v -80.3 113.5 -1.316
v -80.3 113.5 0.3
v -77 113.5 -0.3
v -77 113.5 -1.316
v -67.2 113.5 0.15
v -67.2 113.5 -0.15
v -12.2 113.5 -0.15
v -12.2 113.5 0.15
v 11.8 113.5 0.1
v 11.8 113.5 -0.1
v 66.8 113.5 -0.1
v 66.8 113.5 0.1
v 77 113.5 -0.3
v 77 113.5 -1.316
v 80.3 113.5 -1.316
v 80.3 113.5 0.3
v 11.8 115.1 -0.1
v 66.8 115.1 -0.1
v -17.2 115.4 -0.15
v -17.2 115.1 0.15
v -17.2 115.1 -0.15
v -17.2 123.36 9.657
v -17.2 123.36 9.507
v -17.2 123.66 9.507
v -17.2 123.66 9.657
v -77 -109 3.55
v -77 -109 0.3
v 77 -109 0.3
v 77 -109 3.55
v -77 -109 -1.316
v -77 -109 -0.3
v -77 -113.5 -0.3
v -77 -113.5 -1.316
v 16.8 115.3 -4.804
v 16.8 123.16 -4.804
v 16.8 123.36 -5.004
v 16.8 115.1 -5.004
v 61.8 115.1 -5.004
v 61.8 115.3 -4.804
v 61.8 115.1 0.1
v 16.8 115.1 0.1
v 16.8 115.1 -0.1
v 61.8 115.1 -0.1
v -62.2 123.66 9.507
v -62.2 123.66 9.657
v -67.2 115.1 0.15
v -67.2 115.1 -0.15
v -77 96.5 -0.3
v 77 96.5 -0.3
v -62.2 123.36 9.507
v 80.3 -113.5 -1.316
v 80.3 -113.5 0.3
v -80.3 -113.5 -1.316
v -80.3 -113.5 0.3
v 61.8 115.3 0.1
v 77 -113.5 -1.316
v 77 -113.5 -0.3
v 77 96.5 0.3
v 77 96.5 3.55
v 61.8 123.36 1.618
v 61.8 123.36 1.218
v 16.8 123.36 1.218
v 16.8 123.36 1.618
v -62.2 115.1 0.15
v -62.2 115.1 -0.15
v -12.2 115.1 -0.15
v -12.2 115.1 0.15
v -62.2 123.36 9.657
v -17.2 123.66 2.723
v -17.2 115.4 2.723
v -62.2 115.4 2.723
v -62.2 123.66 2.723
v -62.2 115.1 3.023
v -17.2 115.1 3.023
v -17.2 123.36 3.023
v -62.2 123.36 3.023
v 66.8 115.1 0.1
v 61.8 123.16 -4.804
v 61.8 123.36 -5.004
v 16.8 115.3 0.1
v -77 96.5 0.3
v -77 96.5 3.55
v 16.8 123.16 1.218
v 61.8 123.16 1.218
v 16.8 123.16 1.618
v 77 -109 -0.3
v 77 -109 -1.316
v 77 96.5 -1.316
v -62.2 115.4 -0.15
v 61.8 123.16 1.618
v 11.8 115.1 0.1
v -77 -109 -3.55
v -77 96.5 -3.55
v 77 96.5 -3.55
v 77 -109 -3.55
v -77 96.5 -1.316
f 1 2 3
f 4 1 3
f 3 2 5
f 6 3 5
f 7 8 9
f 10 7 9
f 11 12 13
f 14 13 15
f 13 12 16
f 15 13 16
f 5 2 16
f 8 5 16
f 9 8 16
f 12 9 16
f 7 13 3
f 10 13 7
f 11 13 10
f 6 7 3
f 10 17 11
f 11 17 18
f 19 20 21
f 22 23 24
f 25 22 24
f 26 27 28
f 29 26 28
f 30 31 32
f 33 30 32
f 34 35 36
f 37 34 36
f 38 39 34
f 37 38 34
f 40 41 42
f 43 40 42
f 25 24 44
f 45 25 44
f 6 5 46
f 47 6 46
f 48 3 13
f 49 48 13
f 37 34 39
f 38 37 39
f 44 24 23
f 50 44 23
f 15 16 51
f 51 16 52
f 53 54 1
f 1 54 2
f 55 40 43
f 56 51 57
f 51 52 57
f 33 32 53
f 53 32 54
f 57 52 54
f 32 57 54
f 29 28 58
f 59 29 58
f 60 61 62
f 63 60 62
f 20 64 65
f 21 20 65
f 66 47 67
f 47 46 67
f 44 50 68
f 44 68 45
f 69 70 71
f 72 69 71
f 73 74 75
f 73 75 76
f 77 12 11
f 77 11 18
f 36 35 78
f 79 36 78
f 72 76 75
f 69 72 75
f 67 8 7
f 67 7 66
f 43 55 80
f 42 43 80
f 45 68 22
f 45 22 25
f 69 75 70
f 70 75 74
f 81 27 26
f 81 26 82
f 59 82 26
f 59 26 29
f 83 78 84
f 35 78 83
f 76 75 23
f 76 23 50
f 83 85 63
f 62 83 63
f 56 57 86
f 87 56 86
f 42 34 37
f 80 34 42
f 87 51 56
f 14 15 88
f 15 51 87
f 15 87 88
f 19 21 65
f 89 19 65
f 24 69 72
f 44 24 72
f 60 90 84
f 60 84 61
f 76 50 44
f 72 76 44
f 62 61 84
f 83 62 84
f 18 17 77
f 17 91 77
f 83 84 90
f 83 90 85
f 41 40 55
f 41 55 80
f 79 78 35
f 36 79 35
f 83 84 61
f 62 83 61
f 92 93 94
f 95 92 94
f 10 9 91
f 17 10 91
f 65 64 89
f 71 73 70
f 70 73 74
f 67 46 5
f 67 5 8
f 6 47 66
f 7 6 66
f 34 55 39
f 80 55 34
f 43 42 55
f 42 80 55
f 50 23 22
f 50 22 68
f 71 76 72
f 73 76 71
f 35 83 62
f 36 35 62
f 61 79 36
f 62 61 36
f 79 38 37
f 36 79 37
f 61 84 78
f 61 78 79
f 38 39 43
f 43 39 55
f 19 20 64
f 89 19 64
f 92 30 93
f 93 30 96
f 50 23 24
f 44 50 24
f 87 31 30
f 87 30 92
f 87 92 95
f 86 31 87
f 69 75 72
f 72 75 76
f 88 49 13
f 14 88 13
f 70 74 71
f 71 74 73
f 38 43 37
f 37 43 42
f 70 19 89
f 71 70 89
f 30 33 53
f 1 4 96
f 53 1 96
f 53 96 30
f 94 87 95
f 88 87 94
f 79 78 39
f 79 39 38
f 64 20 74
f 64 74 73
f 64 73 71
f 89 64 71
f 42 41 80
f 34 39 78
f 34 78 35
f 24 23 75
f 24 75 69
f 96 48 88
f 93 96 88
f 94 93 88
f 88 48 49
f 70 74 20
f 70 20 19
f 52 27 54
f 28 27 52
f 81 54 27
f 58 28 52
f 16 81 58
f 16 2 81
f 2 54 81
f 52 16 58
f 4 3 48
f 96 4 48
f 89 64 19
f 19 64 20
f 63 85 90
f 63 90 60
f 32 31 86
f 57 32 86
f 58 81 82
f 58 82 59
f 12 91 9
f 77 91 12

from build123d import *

# Parameters (mm, degrees)
SKETCH1_W                    = 160.6
SKETCH1_H                    = 227
INSULATION_DEPTH             = 0.3
INSULATION_DEPTH_BACK        = 0.3
SKETCH2_W                    = 154
SKETCH2_H                    = 205.5
MAIN_BODY_DEPTH              = 3.55
MAIN_BODY_DEPTH_BACK         = 3.55
SIDE_FOLDS_DEPTH             = 1.016
SKETCH6_W                    = 55
SKETCH6_H                    = 18.6
NEGATIVE_TAB_BASE_DEPTH      = 0.1
NEGATIVE_TAB_BASE_DEPTH_BACK = 0.1
SKETCH7_W                    = 55
SKETCH7_H                    = 18.6
POSITIVE_TAB_BASE_DEPTH      = 0.15
POSITIVE_TAB_BASE_DEPTH_BACK = 0.15
SKETCH110_W                  = 0.3
SKETCH110_H                  = 45
POSITIVE_TAB_DEPTH           = 23.650499994
SKETCH110_ON_SEGMENT_2_W     = 0.3
SKETCH110_ON_SEGMENT_2_H     = 45
POSITIVE_TAB_2_DEPTH         = 49.874449989
SKETCH110_ON_SEGMENT_3_W     = 0.3
SKETCH110_ON_SEGMENT_3_H     = 45
POSITIVE_TAB_3_DEPTH         = 55.260999989
SKETCH110_ON_SEGMENT_4_W     = 0.3
SKETCH110_ON_SEGMENT_4_H     = 45
POSITIVE_TAB_4_DEPTH         = 31.133774994
SKETCH110_ON_SEGMENT_5_W     = 0.3
SKETCH110_ON_SEGMENT_5_H     = 45
POSITIVE_TAB_5_DEPTH         = 1.15
SKETCH113_W                  = 0.2
SKETCH113_H                  = 45
NEGATIVE_TAB_DEPTH           = 23.600222221
SKETCH113_ON_SEGMENT_2_W     = 0.2
SKETCH113_ON_SEGMENT_2_H     = 45
NEGATIVE_TAB_2_DEPTH         = 51.904294442
SKETCH113_ON_SEGMENT_3_W     = 0.2
SKETCH113_ON_SEGMENT_3_H     = 45
NEGATIVE_TAB_3_DEPTH         = 55.060444442
SKETCH113_ON_SEGMENT_4_W     = 0.2
SKETCH113_ON_SEGMENT_4_H     = 45
NEGATIVE_TAB_4_DEPTH         = 30.622297221
SKETCH113_ON_SEGMENT_5_W     = 0.2
SKETCH113_ON_SEGMENT_5_H     = 45
NEGATIVE_TAB_5_DEPTH         = 1.4


with BuildPart() as part:
    # Sketch1 → Insulation (new, two sides)
    with BuildSketch(Plane.XY) as insulation_sk:
        Rectangle(SKETCH1_W, SKETCH1_H)
    extrude(amount=INSULATION_DEPTH)
    extrude(insulation_sk.sketch, amount=-INSULATION_DEPTH_BACK)

    # Sketch2 → Main Body (add, two sides)
    with BuildSketch(Plane.XY) as main_body_sk:
        with Locations((0, -6.25)):
            Rectangle(SKETCH2_W, SKETCH2_H)
    extrude(amount=MAIN_BODY_DEPTH)
    extrude(main_body_sk.sketch, amount=-MAIN_BODY_DEPTH_BACK)

    # Sketch5 → Side Folds (add)
    with BuildSketch(Plane(origin=(0, 0, -0.3), x_dir=(-1, 0, 0), z_dir=(0, 0, -1))):
        Polygon((-77, -109), (-77, 96.5), (-77, 113.5), (-80.3, 113.5), (-80.3, -113.5), (-77, -113.5), align=None)
        Polygon((77, 113.5), (77, 96.5), (77, -109), (77, -113.5), (80.3, -113.5), (80.3, 113.5), align=None)
    extrude(amount=SIDE_FOLDS_DEPTH)

    # Sketch6 → Negative Tab Base (add, two sides)
    with BuildSketch(Plane.XY) as negative_tab_base_sk:
        with Locations((39.3, 105.8)):
            Rectangle(SKETCH6_W, SKETCH6_H)
    extrude(amount=NEGATIVE_TAB_BASE_DEPTH)
    extrude(negative_tab_base_sk.sketch, amount=-NEGATIVE_TAB_BASE_DEPTH_BACK)

    # Sketch7 → Positive Tab Base (add, two sides)
    with BuildSketch(Plane.XY) as positive_tab_base_sk:
        with Locations((-39.7, 105.8)):
            Rectangle(SKETCH7_W, SKETCH7_H)
    extrude(amount=POSITIVE_TAB_BASE_DEPTH)
    extrude(positive_tab_base_sk.sketch, amount=-POSITIVE_TAB_BASE_DEPTH_BACK)


with BuildPart() as body_2:
    # Sketch110 → Positive Tab (new body)
    with BuildSketch(Plane(origin=(-39.7, 115.1, 0), x_dir=(0, 0, -1), z_dir=(0, 1, 0))):
        Rectangle(SKETCH110_W, SKETCH110_H)
    extrude(amount=POSITIVE_TAB_DEPTH)

    # Positive Tab mitre 1
    split(bisect_by=Plane(origin=(-39.7, 115.25, 0), x_dir=(1, 0, 0), z_dir=(0, -0.707106781, -0.707106781)), keep=Keep.TOP)


with BuildPart() as body_3:
    # Sketch110 on segment 2 (carried to segment 2) → Positive Tab 2 (new body)
    with BuildSketch(Plane(origin=(-39.7, 115.25, -23.500499994), x_dir=(0, 1, 0), z_dir=(0, 0, 1))):
        Rectangle(SKETCH110_ON_SEGMENT_2_W, SKETCH110_ON_SEGMENT_2_H)
    extrude(amount=POSITIVE_TAB_2_DEPTH)

    # Positive Tab 2 mitre 1
    split(bisect_by=Plane(origin=(-39.7, 115.25, 0), x_dir=(-1, 0, 0), z_dir=(0, 0.707106781, 0.707106781)), keep=Keep.TOP)

    # Positive Tab 2 mitre 2
    split(bisect_by=Plane(origin=(-39.7, 115.25, 2.87345), x_dir=(1, 0, 0), z_dir=(0, -0.707106781, -0.707106781)), keep=Keep.TOP)


with BuildPart() as body_4:
    # Sketch110 on segment 3 (carried to segment 3) → Positive Tab 3 (new body)
    with BuildSketch(Plane(origin=(-39.7, 91.749500006, 2.87345), x_dir=(0, 0, -1), z_dir=(0, 1, 0))):
        Rectangle(SKETCH110_ON_SEGMENT_3_W, SKETCH110_ON_SEGMENT_3_H)
    extrude(amount=POSITIVE_TAB_3_DEPTH)

    # Positive Tab 3 mitre 1
    split(bisect_by=Plane(origin=(-39.7, 115.25, 2.87345), x_dir=(-1, 0, 0), z_dir=(0, 0.707106781, 0.707106781)), keep=Keep.TOP)

    # Positive Tab 3 mitre 2
    split(bisect_by=Plane(origin=(-39.7, 123.51, 2.87345), x_dir=(1, 0, 0), z_dir=(0, -0.707106781, -0.707106781)), keep=Keep.TOP)


with BuildPart() as body_5:
    # Sketch110 on segment 4 (carried to segment 4) → Positive Tab 4 (new body)
    with BuildSketch(Plane(origin=(-39.7, 123.51, -20.627049994), x_dir=(0, 1, 0), z_dir=(0, 0, 1))):
        Rectangle(SKETCH110_ON_SEGMENT_4_W, SKETCH110_ON_SEGMENT_4_H)
    extrude(amount=POSITIVE_TAB_4_DEPTH)

    # Positive Tab 4 mitre 1
    split(bisect_by=Plane(origin=(-39.7, 123.51, 2.87345), x_dir=(-1, 0, 0), z_dir=(0, 0.707106781, 0.707106781)), keep=Keep.TOP)

    # Positive Tab 4 mitre 2
    split(bisect_by=Plane(origin=(-39.7, 123.51, 9.506725), x_dir=(0, 1, 0), z_dir=(0, 0, -1)), keep=Keep.TOP)


with BuildPart() as body_6:
    # Sketch110 on segment 5 (carried to segment 5) → Positive Tab 5 (new body)
    with BuildSketch(Plane(origin=(-39.7, 123.51, 8.506725), x_dir=(0, 1, 0), z_dir=(0, 0, 1))):
        Rectangle(SKETCH110_ON_SEGMENT_5_W, SKETCH110_ON_SEGMENT_5_H)
    extrude(amount=POSITIVE_TAB_5_DEPTH)

    # Positive Tab 5 mitre 1
    split(bisect_by=Plane(origin=(-39.7, 123.51, 9.506725), x_dir=(0, -1, 0), z_dir=(0, 0, 1)), keep=Keep.TOP)


with BuildPart() as body_7:
    # Sketch113 → Negative Tab (new body)
    with BuildSketch(Plane(origin=(39.3, 115.1, 0), x_dir=(0, 0, -1), z_dir=(0, 1, 0))):
        Rectangle(SKETCH113_W, SKETCH113_H)
    extrude(amount=NEGATIVE_TAB_DEPTH)

    # Negative Tab mitre 1
    split(bisect_by=Plane(origin=(39.3, 115.2, 0), x_dir=(1, 0, 0), z_dir=(0, -0.707106781, 0.707106781)), keep=Keep.TOP)


with BuildPart() as body_8:
    # Sketch113 on segment 2 (carried to segment 2) → Negative Tab 2 (new body)
    with BuildSketch(Plane(origin=(39.3, 115.2, 23.500222221), x_dir=(0, -1, 0), z_dir=(0, 0, -1))):
        Rectangle(SKETCH113_ON_SEGMENT_2_W, SKETCH113_ON_SEGMENT_2_H)
    extrude(amount=NEGATIVE_TAB_2_DEPTH)

    # Negative Tab 2 mitre 1
    split(bisect_by=Plane(origin=(39.3, 115.2, 0), x_dir=(-1, 0, 0), z_dir=(0, 0.707106781, -0.707106781)), keep=Keep.TOP)

    # Negative Tab 2 mitre 2
    split(bisect_by=Plane(origin=(39.3, 115.2, -4.90385), x_dir=(1, 0, 0), z_dir=(0, -0.707106781, 0.707106781)), keep=Keep.TOP)


with BuildPart() as body_9:
    # Sketch113 on segment 3 (carried to segment 3) → Negative Tab 3 (new body)
    with BuildSketch(Plane(origin=(39.3, 91.699777779, -4.90385), x_dir=(0, 0, -1), z_dir=(0, 1, 0))):
        Rectangle(SKETCH113_ON_SEGMENT_3_W, SKETCH113_ON_SEGMENT_3_H)
    extrude(amount=NEGATIVE_TAB_3_DEPTH)

    # Negative Tab 3 mitre 1
    split(bisect_by=Plane(origin=(39.3, 115.2, -4.90385), x_dir=(-1, 0, 0), z_dir=(0, 0.707106781, -0.707106781)), keep=Keep.TOP)

    # Negative Tab 3 mitre 2
    split(bisect_by=Plane(origin=(39.3, 123.26, -4.90385), x_dir=(1, 0, 0), z_dir=(0, -0.707106781, -0.707106781)), keep=Keep.TOP)


with BuildPart() as body_10:
    # Sketch113 on segment 4 (carried to segment 4) → Negative Tab 4 (new body)
    with BuildSketch(Plane(origin=(39.3, 123.26, -28.404072221), x_dir=(0, 1, 0), z_dir=(0, 0, 1))):
        Rectangle(SKETCH113_ON_SEGMENT_4_W, SKETCH113_ON_SEGMENT_4_H)
    extrude(amount=NEGATIVE_TAB_4_DEPTH)

    # Negative Tab 4 mitre 1
    split(bisect_by=Plane(origin=(39.3, 123.26, -4.90385), x_dir=(-1, 0, 0), z_dir=(0, 0.707106781, 0.707106781)), keep=Keep.TOP)

    # Negative Tab 4 mitre 2
    split(bisect_by=Plane(origin=(39.3, 123.26, 1.218225), x_dir=(0, 1, 0), z_dir=(0, 0, -1)), keep=Keep.TOP)


with BuildPart() as body_11:
    # Sketch113 on segment 5 (carried to segment 5) → Negative Tab 5 (new body)
    with BuildSketch(Plane(origin=(39.3, 123.26, 0.218225), x_dir=(0, 1, 0), z_dir=(0, 0, 1))):
        Rectangle(SKETCH113_ON_SEGMENT_5_W, SKETCH113_ON_SEGMENT_5_H)
    extrude(amount=NEGATIVE_TAB_5_DEPTH)

    # Negative Tab 5 mitre 1
    split(bisect_by=Plane(origin=(39.3, 123.26, 1.218225), x_dir=(0, -1, 0), z_dir=(0, 0, 1)), keep=Keep.TOP)


solid = Compound([part.part, body_2.part, body_3.part, body_4.part, body_5.part, body_6.part, body_7.part, body_8.part, body_9.part, body_10.part, body_11.part])
